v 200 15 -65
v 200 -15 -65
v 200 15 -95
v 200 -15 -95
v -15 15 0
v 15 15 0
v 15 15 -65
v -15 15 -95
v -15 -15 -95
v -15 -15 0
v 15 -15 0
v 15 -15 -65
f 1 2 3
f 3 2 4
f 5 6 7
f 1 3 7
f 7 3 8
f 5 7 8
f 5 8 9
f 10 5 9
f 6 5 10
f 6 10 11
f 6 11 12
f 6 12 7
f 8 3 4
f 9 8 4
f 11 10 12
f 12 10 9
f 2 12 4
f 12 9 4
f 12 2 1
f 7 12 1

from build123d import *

# Parameters (mm, degrees)
SKETCH1_W = 30
SKETCH1_H = 30


with BuildPart() as part:
    # Sweep1: sweep along a path in Sketch2
    with BuildLine(Plane(origin=(0, 0, 0), x_dir=(1, 0, 0), z_dir=(0, 1, 0))) as sweep1_path:
        Line((0, 0), (0, 80))
        Line((0, 80), (200, 80))
    # Sketch1 → Sweep1 (sweep)
    with BuildSketch(Plane.XY):
        Rectangle(SKETCH1_W, SKETCH1_H)
    sweep(path=sweep1_path.line, transition=Transition.RIGHT)


solid = part.part
